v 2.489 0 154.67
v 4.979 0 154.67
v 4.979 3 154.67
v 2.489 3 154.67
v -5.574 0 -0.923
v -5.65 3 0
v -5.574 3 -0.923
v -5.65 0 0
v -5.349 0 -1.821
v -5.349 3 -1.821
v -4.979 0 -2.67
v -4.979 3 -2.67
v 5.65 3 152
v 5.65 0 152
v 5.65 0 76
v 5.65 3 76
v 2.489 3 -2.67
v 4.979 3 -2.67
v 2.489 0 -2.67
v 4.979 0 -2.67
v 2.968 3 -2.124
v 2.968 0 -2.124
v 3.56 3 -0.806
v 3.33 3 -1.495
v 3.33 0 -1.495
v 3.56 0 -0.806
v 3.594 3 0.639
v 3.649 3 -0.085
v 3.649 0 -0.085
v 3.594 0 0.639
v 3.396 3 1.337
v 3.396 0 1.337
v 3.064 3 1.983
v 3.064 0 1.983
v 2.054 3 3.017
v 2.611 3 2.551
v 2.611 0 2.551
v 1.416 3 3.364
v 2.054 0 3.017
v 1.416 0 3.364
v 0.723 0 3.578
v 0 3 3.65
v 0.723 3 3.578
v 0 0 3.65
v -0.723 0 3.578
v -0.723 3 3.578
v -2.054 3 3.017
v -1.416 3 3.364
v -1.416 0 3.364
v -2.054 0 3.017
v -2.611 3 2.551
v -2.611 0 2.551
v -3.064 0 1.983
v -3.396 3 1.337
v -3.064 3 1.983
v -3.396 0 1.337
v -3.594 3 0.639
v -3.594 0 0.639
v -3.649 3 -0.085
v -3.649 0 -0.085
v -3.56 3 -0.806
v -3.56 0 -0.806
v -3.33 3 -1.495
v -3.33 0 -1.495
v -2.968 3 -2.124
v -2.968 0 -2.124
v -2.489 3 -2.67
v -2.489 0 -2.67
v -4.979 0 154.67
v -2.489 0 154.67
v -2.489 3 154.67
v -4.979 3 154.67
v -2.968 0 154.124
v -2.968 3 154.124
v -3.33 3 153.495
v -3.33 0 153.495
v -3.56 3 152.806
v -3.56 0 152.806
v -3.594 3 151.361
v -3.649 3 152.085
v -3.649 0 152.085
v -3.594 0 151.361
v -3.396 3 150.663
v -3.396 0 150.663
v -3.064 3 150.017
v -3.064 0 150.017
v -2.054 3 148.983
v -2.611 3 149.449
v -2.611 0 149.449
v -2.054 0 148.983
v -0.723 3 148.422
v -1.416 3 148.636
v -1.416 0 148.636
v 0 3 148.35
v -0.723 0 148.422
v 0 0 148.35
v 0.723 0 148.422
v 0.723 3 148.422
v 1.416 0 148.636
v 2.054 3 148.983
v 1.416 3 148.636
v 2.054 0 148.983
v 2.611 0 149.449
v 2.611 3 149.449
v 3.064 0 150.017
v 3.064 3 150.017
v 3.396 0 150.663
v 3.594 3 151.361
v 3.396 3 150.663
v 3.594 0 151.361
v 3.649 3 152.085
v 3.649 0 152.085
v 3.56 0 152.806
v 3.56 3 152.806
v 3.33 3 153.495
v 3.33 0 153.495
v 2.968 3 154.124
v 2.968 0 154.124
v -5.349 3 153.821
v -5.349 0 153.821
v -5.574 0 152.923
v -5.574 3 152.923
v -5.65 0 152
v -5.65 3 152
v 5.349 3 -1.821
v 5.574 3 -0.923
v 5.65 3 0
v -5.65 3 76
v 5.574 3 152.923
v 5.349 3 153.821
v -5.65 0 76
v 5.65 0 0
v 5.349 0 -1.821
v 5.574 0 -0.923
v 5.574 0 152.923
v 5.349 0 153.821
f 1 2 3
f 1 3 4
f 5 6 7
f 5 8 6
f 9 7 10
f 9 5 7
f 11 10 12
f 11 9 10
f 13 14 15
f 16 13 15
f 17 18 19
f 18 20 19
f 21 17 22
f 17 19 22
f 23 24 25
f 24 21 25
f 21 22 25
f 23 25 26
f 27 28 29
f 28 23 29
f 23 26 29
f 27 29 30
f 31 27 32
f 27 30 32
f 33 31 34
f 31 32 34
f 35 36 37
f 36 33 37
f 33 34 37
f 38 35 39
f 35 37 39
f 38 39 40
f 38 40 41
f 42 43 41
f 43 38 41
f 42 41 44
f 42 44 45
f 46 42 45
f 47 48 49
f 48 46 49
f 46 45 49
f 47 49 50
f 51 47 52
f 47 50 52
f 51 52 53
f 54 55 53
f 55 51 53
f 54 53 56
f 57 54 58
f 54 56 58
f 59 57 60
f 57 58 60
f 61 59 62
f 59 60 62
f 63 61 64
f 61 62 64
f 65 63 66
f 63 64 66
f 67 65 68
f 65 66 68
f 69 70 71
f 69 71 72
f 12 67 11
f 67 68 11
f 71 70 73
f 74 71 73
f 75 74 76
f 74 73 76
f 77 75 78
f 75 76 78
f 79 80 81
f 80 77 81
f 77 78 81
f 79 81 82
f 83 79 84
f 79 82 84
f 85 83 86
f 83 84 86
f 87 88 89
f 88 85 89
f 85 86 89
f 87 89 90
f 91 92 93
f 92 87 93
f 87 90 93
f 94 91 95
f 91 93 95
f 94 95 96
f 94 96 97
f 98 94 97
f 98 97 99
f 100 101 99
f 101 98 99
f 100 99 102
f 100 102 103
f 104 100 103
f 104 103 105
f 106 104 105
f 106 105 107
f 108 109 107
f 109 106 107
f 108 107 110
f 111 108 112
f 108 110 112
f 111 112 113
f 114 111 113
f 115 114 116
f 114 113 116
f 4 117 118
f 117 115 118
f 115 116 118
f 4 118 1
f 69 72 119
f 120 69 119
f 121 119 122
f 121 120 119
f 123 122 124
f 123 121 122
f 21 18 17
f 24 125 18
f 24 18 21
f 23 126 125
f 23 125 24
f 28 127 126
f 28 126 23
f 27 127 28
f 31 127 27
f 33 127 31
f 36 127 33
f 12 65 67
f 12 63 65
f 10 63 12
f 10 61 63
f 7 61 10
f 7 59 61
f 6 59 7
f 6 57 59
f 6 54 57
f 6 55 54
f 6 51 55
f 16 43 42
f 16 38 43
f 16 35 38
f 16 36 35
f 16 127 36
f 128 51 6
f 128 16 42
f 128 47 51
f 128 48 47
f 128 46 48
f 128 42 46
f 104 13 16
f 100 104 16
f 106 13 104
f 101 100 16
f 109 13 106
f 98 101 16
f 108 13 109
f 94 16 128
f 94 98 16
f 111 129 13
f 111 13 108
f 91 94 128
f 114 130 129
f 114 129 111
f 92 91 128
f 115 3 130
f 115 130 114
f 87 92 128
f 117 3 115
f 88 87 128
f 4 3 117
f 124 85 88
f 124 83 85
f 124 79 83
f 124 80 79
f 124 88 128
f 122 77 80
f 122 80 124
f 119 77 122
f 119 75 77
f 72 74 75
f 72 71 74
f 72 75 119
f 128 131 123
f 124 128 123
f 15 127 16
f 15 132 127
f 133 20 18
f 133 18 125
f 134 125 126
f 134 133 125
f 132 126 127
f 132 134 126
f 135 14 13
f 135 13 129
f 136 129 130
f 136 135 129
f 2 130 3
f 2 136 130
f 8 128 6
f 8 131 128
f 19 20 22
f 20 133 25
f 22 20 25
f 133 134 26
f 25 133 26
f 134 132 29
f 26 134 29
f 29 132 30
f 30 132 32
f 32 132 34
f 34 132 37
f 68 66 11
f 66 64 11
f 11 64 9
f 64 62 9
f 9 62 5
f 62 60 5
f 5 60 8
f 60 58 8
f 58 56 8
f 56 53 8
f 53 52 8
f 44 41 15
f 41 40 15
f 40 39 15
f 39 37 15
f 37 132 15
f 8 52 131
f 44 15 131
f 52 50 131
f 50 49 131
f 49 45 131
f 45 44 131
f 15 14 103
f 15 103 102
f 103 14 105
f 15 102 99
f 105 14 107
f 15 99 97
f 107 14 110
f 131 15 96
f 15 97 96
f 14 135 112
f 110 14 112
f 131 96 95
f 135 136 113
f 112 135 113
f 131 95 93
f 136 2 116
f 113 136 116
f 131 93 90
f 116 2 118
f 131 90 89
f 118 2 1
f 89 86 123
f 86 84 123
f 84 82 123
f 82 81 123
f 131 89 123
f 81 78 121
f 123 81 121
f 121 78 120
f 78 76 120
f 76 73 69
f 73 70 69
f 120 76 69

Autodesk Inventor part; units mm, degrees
ref_plane "YZ Plane" through (0, 0, 0) normal (1, 0, 0) x (0, 1, 0)
ref_plane "XZ Plane" through (0, 0, 0) normal (0, 1, 0) x (-1, 0, 0)
ref_plane "XY Plane" through (0, 0, 0) normal (0, 0, 1) x (1, 0, 0)
sketch "Sketch1" plane through (0, 0, 0) normal (0, 1, 0) x (-1, 0, 0)
  arc A0 (2.4889, -2.6698) -> (-2.4889, -2.6698) centre (0, 0) ccw
  line L0 (2.4889, -2.6698) -> (4.9794, -2.6698)
  line L1 (-4.9794, -2.6698) -> (-2.4889, -2.6698)
  line L2 (-5.65, 0) -> (-5.65, 76)
  line L3 (5.65, 76) -> (5.65, 0)
  arc A1 (-2.4889, 154.6698) -> (2.4889, 154.6698) centre (0, 152) ccw
  line L4 (2.4889, 154.6698) -> (4.9794, 154.6698)
  line L5 (-4.9794, 154.6698) -> (-2.4889, 154.6698)
  line L6 (-5.65, 152) -> (-5.65, 76)
  line L7 (5.65, 76) -> (5.65, 152)
  arc A2 (4.9794, -2.6698) -> (5.65, 0) centre (0, 0) ccw
  arc A3 (-5.65, 0) -> (-4.9794, -2.6698) centre (0, 0) ccw
  arc A4 (-4.9794, 154.6698) -> (-5.65, 152) centre (0, 152) ccw
  arc A5 (5.65, 152) -> (4.9794, 154.6698) centre (0, 152) ccw
  dimension "d5" = 7.3
  dimension "d7" = 76
extrude "Extrusion1" add sketch "Sketch1" along normal blind 3
properties part number "Holder 2"
